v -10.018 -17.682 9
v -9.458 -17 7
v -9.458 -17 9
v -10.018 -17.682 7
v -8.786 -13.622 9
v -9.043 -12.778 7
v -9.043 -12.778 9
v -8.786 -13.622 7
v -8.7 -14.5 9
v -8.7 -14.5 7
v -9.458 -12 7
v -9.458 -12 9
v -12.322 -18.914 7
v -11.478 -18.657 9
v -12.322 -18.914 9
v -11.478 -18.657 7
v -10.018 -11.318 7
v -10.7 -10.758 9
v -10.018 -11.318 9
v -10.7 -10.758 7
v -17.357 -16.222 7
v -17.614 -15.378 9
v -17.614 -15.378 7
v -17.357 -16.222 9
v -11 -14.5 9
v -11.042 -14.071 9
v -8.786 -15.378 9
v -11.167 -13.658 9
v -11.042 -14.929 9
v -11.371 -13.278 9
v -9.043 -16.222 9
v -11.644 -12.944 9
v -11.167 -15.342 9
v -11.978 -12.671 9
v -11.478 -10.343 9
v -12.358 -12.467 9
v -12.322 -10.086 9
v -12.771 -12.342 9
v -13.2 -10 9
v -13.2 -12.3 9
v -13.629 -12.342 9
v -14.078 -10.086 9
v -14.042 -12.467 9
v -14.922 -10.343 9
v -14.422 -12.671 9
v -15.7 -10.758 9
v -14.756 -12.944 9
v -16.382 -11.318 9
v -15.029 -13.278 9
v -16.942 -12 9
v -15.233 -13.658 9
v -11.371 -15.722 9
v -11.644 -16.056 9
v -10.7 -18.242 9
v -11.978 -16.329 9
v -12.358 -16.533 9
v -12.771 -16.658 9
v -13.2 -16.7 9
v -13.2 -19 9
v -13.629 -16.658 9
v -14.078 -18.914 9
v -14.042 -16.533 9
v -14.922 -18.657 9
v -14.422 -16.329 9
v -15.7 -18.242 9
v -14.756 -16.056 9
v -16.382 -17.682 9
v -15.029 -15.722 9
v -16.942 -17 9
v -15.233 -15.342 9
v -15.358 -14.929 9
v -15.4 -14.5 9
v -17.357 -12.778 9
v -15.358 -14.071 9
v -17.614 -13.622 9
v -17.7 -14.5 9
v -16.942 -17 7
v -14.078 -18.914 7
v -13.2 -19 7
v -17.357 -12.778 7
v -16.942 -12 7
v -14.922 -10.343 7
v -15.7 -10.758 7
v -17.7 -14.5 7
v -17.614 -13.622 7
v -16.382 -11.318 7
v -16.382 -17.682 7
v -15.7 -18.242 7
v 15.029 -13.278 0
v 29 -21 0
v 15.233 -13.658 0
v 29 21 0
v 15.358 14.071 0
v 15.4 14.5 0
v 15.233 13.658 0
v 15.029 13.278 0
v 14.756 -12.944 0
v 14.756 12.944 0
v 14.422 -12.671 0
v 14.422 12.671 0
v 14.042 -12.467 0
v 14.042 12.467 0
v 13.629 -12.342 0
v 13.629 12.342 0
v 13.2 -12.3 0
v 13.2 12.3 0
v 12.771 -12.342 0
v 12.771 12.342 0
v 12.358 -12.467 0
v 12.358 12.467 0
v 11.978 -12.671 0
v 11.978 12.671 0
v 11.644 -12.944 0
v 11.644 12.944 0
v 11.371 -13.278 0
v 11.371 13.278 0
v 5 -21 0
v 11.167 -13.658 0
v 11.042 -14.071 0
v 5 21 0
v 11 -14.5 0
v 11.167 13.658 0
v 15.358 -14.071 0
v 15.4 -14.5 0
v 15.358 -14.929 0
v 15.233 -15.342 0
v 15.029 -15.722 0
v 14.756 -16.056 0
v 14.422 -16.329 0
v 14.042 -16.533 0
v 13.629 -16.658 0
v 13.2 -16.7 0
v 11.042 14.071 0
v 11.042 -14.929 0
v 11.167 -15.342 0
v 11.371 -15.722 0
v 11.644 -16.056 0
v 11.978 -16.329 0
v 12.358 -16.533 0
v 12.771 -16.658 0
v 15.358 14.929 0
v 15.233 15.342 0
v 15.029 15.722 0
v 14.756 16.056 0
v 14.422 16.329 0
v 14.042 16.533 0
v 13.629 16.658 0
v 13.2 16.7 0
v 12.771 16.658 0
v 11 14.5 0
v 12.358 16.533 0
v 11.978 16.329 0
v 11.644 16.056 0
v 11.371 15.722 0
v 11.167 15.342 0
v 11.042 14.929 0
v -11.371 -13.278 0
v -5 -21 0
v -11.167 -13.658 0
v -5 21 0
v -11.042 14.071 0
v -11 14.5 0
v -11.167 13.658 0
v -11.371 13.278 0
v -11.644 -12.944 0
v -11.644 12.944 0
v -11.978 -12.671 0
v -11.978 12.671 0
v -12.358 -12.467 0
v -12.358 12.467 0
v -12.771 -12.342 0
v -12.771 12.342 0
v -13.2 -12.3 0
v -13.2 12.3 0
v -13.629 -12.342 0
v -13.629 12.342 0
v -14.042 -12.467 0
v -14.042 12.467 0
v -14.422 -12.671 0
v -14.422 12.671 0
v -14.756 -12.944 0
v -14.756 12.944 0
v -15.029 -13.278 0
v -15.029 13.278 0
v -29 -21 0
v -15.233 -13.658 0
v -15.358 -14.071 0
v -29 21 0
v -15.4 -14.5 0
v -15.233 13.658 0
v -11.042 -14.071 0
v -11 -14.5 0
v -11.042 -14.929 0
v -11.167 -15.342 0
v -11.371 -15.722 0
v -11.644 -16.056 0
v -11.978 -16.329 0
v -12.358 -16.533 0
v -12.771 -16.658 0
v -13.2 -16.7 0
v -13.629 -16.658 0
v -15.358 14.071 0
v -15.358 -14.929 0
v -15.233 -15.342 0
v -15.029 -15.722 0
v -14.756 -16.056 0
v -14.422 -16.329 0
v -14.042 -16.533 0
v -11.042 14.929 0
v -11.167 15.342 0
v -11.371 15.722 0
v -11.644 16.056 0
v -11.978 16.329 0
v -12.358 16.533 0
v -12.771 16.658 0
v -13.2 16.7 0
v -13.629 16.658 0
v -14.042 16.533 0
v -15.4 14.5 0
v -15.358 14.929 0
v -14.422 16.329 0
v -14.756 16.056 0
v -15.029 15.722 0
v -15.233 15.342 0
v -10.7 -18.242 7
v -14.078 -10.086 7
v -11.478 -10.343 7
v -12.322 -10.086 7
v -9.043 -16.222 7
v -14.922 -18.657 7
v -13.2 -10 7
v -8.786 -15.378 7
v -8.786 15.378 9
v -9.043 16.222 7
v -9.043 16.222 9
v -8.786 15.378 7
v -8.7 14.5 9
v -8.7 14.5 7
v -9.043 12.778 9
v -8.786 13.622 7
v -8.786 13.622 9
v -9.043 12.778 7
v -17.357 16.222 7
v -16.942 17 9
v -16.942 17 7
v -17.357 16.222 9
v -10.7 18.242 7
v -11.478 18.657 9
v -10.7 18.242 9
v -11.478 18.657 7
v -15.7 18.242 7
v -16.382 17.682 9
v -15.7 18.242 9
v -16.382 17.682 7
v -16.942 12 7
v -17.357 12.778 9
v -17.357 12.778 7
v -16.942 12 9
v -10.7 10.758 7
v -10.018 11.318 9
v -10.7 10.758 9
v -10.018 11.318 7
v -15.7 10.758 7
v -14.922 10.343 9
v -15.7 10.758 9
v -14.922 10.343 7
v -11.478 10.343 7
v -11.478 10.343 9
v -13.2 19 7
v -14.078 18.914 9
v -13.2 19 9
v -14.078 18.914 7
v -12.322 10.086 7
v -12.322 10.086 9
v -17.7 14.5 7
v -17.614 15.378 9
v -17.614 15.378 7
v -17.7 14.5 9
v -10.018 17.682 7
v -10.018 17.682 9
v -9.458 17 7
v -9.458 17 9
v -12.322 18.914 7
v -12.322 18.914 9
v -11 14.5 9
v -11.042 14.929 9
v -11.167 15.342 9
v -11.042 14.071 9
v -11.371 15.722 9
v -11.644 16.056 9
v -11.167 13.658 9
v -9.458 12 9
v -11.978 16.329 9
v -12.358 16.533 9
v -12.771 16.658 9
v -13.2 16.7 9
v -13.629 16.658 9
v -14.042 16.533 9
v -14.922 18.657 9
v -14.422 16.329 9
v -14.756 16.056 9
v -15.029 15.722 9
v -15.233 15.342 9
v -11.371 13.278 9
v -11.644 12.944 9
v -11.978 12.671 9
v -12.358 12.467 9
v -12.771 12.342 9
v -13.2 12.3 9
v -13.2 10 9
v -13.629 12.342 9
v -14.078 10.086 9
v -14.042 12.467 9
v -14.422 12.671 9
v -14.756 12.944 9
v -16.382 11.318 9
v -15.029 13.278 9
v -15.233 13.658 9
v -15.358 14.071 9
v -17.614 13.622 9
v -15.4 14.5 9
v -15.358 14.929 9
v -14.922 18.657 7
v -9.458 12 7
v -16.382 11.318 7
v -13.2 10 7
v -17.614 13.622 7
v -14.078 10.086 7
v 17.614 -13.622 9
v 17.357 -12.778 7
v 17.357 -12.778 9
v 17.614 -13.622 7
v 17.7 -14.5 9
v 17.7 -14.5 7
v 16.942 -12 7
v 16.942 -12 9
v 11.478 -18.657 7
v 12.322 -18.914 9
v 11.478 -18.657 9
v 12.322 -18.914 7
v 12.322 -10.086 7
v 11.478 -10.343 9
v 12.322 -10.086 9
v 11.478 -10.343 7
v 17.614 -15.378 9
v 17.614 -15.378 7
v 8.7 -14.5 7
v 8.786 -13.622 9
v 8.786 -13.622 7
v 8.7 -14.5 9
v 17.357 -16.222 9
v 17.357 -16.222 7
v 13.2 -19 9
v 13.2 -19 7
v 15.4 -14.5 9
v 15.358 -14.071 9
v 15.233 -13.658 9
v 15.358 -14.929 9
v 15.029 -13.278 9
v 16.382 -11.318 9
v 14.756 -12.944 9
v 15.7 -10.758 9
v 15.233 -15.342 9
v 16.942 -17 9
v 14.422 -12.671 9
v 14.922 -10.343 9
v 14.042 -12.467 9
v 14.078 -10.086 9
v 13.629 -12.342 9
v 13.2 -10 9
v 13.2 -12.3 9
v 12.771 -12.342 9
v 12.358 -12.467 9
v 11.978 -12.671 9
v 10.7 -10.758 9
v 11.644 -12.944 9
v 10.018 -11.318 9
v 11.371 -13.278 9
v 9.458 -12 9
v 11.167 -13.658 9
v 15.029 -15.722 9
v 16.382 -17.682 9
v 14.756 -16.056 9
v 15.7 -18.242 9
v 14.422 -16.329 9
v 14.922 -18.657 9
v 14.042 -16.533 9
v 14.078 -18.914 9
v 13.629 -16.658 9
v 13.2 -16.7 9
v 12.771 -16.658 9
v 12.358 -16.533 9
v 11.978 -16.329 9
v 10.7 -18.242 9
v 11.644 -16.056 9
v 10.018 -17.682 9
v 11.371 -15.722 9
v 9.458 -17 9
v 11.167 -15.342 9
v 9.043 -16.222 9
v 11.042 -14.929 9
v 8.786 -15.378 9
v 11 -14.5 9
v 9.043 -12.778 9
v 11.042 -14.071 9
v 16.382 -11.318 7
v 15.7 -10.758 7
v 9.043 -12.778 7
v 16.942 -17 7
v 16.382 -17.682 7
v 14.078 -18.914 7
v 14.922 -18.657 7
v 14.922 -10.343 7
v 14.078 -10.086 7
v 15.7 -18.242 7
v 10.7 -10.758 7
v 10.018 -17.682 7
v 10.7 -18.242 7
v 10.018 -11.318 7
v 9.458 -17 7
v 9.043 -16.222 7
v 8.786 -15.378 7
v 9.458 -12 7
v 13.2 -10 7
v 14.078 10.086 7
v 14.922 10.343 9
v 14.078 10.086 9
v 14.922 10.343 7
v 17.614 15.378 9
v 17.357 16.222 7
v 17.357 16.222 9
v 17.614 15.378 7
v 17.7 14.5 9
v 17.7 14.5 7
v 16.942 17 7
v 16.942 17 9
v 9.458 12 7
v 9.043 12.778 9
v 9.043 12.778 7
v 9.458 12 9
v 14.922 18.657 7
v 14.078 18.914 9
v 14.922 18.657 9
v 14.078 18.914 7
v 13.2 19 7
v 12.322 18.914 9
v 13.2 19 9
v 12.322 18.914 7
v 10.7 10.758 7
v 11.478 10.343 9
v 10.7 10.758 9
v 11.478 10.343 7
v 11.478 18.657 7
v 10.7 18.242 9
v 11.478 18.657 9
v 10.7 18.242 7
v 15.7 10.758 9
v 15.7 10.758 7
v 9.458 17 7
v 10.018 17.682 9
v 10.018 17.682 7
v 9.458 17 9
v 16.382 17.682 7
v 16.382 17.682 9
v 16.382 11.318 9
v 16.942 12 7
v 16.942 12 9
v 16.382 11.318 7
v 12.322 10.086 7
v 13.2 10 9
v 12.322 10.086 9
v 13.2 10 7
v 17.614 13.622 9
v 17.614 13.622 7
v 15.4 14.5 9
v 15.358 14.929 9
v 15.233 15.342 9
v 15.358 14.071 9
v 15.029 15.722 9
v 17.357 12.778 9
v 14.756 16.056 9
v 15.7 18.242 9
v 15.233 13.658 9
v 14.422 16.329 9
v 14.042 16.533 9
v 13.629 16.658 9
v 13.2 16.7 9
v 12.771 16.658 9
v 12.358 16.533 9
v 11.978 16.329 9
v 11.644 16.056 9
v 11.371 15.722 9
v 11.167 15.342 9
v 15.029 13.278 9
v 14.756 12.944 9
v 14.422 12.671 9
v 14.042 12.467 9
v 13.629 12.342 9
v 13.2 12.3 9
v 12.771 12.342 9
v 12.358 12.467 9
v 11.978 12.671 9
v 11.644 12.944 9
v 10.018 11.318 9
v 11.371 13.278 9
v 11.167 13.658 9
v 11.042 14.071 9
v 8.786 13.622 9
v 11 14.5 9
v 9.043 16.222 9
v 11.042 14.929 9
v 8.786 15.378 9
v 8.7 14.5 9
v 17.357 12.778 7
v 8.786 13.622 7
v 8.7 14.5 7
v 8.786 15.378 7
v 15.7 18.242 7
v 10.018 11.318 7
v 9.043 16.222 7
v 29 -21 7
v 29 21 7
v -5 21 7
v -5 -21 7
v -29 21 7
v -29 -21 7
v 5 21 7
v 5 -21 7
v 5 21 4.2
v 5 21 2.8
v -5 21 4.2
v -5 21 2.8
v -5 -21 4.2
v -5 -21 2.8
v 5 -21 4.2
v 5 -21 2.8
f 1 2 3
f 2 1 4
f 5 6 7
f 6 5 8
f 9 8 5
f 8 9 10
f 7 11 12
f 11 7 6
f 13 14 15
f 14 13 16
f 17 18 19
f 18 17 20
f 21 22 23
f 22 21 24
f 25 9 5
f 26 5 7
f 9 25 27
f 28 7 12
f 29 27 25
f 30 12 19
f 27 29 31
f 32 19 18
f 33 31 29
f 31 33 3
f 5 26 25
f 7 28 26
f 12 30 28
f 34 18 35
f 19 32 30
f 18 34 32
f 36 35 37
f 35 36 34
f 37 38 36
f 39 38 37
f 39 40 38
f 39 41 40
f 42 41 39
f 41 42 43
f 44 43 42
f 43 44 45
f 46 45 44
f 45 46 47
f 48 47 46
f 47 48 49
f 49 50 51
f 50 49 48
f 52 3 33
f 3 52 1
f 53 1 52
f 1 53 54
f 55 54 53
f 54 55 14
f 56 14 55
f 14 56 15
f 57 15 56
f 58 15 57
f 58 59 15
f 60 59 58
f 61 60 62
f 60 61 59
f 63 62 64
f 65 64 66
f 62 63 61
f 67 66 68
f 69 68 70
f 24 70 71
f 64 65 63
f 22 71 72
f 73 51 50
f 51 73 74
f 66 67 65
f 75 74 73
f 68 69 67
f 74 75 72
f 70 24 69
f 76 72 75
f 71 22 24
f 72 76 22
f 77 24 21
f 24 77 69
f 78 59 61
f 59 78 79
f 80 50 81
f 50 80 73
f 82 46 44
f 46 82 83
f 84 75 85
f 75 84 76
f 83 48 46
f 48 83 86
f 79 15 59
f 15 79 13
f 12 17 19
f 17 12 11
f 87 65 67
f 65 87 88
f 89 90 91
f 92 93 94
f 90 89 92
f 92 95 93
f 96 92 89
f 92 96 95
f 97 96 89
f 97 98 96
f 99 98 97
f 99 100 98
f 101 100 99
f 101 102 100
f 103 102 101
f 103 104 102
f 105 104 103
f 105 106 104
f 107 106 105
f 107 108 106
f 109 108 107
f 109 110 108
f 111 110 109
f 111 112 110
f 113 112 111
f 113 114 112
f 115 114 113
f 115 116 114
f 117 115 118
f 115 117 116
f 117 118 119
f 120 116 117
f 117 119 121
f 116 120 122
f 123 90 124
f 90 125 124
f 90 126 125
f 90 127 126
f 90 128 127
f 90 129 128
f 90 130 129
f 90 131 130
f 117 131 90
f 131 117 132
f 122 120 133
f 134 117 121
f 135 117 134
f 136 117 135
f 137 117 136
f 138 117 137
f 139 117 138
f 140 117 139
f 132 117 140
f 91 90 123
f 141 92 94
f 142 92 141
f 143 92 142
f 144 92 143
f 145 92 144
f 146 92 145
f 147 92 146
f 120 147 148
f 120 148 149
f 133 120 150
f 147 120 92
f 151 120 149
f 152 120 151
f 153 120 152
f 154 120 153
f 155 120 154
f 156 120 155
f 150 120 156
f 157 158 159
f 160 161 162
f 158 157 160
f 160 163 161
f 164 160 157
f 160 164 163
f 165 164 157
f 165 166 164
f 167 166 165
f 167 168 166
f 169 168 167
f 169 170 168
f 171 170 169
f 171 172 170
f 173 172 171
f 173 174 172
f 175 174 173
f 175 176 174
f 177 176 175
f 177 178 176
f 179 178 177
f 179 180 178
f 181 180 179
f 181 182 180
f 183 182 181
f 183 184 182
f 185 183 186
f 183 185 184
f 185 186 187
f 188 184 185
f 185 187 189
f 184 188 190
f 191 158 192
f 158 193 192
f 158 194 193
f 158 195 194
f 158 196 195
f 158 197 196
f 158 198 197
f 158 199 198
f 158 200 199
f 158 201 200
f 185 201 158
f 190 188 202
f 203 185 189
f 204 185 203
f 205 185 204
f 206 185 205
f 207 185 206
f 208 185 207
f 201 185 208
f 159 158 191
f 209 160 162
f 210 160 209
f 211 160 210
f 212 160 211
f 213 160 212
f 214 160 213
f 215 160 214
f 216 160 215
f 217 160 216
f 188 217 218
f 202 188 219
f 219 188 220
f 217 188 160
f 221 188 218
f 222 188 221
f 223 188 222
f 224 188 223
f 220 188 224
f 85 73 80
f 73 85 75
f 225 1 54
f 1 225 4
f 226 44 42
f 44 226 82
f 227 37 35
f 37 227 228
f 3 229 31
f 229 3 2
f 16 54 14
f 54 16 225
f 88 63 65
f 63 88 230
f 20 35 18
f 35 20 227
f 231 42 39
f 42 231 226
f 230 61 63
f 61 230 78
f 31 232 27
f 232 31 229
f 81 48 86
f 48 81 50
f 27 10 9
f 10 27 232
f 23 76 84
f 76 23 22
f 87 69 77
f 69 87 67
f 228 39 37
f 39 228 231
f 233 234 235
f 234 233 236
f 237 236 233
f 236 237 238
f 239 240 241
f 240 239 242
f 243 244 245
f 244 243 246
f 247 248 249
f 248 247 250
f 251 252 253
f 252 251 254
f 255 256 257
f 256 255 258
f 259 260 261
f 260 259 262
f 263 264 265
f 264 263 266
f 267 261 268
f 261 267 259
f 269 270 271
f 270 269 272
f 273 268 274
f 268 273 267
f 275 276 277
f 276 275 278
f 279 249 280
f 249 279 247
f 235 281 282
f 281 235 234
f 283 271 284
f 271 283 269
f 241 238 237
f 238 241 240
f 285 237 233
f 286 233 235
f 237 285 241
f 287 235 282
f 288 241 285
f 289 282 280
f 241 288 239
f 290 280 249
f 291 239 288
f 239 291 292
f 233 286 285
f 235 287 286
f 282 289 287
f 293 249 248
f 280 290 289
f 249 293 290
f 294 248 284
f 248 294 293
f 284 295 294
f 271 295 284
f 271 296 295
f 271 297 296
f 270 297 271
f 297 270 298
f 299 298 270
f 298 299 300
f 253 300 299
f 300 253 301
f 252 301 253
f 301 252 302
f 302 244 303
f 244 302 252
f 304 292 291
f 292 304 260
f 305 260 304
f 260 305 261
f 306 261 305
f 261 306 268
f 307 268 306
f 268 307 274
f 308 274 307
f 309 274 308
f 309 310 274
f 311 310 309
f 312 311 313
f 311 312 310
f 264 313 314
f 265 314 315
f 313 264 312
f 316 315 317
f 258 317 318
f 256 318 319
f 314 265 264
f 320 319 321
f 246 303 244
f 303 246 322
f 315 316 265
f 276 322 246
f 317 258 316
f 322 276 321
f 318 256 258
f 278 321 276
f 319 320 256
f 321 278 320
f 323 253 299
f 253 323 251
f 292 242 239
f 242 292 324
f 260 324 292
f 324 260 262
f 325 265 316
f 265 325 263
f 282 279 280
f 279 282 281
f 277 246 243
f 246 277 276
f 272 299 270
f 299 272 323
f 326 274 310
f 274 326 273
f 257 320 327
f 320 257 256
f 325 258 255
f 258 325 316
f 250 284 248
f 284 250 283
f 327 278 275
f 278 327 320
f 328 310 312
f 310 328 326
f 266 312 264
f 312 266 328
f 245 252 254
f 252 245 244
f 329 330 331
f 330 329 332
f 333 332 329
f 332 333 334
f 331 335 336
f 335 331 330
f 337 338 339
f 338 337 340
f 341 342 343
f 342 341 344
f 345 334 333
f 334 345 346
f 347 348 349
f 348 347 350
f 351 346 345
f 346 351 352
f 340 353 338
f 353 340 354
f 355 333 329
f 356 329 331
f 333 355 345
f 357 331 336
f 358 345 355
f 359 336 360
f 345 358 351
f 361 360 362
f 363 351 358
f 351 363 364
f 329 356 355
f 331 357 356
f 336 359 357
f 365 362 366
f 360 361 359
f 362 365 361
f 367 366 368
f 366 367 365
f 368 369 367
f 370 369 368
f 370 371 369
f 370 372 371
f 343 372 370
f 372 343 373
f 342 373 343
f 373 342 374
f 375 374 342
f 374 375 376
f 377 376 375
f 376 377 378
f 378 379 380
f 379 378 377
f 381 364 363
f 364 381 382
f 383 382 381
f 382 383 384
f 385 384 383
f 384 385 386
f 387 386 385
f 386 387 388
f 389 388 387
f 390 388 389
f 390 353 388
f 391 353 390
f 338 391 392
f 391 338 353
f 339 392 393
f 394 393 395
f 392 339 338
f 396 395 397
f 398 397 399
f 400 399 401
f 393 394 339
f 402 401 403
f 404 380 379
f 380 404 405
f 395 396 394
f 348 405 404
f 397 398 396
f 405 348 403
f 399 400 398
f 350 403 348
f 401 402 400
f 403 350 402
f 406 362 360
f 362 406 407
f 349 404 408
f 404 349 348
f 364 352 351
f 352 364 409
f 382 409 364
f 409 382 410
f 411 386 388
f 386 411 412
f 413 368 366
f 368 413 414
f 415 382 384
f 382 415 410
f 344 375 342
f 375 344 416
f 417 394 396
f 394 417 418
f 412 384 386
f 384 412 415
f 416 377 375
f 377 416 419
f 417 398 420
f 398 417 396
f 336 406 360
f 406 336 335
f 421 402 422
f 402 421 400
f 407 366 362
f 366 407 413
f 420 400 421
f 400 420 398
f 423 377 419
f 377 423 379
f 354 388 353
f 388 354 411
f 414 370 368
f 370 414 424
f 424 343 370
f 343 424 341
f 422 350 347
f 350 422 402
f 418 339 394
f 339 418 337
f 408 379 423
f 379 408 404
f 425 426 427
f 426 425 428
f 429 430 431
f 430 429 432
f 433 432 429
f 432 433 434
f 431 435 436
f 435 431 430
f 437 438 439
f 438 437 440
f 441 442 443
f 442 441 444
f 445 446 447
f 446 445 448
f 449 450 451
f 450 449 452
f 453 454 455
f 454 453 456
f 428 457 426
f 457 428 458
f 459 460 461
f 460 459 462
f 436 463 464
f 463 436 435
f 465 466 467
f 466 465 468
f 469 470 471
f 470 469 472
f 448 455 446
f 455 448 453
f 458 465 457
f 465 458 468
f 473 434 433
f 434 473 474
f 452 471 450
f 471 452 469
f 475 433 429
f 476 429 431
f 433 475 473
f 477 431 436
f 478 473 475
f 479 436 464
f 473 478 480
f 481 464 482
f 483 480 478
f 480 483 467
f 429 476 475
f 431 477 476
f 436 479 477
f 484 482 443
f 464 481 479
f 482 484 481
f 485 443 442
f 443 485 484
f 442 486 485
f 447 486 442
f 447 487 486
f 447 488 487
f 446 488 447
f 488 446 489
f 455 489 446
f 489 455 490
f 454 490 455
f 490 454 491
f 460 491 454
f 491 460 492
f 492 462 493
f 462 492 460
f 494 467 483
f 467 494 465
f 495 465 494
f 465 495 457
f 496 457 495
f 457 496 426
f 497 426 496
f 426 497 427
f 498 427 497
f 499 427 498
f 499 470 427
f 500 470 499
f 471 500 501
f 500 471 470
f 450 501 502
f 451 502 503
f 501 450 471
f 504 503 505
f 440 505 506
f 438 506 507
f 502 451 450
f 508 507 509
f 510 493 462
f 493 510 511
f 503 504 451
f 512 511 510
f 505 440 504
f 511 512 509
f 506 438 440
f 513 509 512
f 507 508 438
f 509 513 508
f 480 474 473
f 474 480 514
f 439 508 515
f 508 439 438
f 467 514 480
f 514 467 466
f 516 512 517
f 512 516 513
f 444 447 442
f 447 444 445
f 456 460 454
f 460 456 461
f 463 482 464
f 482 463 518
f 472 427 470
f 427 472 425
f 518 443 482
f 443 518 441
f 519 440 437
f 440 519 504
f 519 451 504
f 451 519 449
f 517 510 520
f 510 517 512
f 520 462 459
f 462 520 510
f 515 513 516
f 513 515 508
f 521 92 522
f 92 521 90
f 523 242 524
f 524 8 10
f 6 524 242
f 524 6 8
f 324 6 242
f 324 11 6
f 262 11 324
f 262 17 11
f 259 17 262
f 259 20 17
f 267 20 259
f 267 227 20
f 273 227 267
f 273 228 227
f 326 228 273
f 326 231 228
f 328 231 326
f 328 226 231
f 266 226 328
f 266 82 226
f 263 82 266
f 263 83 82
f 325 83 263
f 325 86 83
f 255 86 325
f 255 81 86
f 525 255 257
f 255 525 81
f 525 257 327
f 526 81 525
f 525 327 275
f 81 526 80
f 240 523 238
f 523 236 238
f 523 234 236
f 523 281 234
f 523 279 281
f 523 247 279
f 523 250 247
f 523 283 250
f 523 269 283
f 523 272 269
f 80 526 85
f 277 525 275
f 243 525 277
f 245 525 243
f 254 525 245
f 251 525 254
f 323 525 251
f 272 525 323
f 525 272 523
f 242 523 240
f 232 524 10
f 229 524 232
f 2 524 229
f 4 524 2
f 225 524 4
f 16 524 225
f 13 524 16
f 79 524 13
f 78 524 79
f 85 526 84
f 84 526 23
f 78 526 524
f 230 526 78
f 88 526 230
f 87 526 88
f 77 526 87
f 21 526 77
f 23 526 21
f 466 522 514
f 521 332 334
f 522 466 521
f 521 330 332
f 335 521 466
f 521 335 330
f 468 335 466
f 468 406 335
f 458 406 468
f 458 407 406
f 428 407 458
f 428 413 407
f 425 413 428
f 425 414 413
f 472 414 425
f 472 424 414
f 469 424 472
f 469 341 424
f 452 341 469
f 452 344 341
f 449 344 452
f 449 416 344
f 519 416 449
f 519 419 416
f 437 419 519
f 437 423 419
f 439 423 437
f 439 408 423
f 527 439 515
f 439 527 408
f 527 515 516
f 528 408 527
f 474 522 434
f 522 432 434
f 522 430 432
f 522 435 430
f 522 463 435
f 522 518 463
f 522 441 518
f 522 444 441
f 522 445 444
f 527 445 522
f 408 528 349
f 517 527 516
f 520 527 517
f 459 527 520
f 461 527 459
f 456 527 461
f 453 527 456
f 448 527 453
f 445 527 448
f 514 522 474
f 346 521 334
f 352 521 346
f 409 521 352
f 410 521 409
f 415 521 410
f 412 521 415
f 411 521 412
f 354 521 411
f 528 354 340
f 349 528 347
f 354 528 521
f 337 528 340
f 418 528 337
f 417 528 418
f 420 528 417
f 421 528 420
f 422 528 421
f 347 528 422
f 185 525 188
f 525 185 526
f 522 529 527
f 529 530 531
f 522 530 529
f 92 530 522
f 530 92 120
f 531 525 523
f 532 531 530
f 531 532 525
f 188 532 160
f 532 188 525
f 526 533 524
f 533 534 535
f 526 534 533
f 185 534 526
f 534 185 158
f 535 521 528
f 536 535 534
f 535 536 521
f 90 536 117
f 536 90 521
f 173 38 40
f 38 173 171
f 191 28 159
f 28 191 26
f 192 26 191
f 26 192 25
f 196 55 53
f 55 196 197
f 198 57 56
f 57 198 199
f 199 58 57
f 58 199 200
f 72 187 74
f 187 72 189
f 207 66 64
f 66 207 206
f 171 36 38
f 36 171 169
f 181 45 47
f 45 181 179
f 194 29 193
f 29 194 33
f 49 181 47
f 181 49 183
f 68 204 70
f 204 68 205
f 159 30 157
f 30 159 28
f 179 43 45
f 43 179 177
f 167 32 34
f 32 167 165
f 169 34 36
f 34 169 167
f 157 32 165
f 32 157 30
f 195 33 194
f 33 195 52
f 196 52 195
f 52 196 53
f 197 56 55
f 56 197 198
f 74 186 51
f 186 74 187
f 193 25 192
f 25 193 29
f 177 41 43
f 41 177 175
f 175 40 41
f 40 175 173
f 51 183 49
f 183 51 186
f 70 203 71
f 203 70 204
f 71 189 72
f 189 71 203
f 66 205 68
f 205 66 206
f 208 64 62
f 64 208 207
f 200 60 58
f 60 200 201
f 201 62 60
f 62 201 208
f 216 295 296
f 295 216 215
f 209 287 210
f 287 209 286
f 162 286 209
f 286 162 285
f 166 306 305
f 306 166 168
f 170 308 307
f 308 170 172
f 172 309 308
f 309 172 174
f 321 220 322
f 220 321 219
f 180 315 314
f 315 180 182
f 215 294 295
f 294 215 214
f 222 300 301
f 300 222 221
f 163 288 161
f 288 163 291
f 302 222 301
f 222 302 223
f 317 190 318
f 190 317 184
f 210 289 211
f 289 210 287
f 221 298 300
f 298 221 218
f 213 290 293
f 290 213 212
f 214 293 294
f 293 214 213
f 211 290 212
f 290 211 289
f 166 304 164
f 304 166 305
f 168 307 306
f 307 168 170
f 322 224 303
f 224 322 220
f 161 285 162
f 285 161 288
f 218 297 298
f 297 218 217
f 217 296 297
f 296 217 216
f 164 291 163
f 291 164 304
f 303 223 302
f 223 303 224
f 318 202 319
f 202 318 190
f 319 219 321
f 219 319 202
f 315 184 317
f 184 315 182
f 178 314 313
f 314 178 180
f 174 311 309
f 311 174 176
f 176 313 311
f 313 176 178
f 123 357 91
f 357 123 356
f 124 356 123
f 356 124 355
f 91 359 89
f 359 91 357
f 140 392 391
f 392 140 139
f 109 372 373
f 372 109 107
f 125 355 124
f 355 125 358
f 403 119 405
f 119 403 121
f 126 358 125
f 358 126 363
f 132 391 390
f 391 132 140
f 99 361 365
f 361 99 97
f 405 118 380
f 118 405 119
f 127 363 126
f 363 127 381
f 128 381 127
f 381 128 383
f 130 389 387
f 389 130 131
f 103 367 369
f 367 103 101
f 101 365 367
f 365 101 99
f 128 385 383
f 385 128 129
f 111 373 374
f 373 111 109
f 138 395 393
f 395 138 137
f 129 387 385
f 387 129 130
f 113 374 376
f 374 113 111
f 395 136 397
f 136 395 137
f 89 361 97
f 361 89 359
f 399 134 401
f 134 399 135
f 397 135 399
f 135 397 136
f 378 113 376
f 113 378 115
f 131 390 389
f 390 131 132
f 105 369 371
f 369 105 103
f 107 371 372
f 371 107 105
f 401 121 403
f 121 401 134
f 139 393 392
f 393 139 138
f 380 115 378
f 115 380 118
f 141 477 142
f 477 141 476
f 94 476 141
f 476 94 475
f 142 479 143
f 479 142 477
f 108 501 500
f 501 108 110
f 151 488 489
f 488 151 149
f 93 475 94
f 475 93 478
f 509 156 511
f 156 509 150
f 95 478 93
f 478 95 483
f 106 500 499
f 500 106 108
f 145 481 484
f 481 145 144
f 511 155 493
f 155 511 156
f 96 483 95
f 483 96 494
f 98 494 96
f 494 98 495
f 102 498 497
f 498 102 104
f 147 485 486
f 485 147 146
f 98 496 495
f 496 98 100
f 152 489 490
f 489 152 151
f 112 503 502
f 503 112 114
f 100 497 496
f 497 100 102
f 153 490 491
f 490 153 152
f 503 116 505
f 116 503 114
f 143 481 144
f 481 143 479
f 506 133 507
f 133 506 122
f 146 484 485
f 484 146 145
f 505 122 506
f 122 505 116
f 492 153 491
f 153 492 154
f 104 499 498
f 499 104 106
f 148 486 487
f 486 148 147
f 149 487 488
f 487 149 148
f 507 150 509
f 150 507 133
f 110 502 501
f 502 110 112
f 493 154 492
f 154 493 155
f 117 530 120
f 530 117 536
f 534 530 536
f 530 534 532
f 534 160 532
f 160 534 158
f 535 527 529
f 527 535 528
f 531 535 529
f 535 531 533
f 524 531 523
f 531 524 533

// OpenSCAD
$fn = 32;

// ----------------------------------------------------------------------
// Living hinge: 58 x 42 mm plates, 1.4 mm flexible web
// ----------------------------------------------------------------------

// --- parameters (mm) ---
plate_len = 24;           // plate length outside the web
plate_w = 42;             // plate width
thick = 7;                // plate thickness
web_half = 5;             // half width of the flex band
web_t = 1.4;              // flexible web thickness
web_z = 2.8;              // web position inside the thickness
boss_d = 9;               // screw boss diameter
boss_h = 9;               // screw boss height
boss_x = 13.2;            // screw boss distance from the web
screw_d = 4.4;            // screw hole

difference() {
  union() {
    /* one flat strip, later thinned at the middle */
    translate([-29, -21, 0]) cube([58, 42, 7]);
    /* screw bosses, sunk 0.5 mm into the plates */
    for (sx = [-13.2, 13.2]) {
      for (sy = [-14.5, 14.5]) {
        translate([sx, sy, 0]) cylinder(h = boss_h, d = boss_d);
      }
    }
  }
  /* channel from below: leaves the web on top of it */
  translate([-5, -23.5, -2.5]) cube([10, 47, 5.3]);
  /* channel from above: thins the web down to web_t */
  translate([-5, -23.5, 4.2]) cube([10, 47, 5.3]);
  /* screw holes through the bosses */
  for (sx = [-13.2, 13.2]) {
    for (sy = [-14.5, 14.5]) {
      translate([sx, sy, -2.5]) cylinder(h = boss_h + 5, d = screw_d);
    }
  }
}
